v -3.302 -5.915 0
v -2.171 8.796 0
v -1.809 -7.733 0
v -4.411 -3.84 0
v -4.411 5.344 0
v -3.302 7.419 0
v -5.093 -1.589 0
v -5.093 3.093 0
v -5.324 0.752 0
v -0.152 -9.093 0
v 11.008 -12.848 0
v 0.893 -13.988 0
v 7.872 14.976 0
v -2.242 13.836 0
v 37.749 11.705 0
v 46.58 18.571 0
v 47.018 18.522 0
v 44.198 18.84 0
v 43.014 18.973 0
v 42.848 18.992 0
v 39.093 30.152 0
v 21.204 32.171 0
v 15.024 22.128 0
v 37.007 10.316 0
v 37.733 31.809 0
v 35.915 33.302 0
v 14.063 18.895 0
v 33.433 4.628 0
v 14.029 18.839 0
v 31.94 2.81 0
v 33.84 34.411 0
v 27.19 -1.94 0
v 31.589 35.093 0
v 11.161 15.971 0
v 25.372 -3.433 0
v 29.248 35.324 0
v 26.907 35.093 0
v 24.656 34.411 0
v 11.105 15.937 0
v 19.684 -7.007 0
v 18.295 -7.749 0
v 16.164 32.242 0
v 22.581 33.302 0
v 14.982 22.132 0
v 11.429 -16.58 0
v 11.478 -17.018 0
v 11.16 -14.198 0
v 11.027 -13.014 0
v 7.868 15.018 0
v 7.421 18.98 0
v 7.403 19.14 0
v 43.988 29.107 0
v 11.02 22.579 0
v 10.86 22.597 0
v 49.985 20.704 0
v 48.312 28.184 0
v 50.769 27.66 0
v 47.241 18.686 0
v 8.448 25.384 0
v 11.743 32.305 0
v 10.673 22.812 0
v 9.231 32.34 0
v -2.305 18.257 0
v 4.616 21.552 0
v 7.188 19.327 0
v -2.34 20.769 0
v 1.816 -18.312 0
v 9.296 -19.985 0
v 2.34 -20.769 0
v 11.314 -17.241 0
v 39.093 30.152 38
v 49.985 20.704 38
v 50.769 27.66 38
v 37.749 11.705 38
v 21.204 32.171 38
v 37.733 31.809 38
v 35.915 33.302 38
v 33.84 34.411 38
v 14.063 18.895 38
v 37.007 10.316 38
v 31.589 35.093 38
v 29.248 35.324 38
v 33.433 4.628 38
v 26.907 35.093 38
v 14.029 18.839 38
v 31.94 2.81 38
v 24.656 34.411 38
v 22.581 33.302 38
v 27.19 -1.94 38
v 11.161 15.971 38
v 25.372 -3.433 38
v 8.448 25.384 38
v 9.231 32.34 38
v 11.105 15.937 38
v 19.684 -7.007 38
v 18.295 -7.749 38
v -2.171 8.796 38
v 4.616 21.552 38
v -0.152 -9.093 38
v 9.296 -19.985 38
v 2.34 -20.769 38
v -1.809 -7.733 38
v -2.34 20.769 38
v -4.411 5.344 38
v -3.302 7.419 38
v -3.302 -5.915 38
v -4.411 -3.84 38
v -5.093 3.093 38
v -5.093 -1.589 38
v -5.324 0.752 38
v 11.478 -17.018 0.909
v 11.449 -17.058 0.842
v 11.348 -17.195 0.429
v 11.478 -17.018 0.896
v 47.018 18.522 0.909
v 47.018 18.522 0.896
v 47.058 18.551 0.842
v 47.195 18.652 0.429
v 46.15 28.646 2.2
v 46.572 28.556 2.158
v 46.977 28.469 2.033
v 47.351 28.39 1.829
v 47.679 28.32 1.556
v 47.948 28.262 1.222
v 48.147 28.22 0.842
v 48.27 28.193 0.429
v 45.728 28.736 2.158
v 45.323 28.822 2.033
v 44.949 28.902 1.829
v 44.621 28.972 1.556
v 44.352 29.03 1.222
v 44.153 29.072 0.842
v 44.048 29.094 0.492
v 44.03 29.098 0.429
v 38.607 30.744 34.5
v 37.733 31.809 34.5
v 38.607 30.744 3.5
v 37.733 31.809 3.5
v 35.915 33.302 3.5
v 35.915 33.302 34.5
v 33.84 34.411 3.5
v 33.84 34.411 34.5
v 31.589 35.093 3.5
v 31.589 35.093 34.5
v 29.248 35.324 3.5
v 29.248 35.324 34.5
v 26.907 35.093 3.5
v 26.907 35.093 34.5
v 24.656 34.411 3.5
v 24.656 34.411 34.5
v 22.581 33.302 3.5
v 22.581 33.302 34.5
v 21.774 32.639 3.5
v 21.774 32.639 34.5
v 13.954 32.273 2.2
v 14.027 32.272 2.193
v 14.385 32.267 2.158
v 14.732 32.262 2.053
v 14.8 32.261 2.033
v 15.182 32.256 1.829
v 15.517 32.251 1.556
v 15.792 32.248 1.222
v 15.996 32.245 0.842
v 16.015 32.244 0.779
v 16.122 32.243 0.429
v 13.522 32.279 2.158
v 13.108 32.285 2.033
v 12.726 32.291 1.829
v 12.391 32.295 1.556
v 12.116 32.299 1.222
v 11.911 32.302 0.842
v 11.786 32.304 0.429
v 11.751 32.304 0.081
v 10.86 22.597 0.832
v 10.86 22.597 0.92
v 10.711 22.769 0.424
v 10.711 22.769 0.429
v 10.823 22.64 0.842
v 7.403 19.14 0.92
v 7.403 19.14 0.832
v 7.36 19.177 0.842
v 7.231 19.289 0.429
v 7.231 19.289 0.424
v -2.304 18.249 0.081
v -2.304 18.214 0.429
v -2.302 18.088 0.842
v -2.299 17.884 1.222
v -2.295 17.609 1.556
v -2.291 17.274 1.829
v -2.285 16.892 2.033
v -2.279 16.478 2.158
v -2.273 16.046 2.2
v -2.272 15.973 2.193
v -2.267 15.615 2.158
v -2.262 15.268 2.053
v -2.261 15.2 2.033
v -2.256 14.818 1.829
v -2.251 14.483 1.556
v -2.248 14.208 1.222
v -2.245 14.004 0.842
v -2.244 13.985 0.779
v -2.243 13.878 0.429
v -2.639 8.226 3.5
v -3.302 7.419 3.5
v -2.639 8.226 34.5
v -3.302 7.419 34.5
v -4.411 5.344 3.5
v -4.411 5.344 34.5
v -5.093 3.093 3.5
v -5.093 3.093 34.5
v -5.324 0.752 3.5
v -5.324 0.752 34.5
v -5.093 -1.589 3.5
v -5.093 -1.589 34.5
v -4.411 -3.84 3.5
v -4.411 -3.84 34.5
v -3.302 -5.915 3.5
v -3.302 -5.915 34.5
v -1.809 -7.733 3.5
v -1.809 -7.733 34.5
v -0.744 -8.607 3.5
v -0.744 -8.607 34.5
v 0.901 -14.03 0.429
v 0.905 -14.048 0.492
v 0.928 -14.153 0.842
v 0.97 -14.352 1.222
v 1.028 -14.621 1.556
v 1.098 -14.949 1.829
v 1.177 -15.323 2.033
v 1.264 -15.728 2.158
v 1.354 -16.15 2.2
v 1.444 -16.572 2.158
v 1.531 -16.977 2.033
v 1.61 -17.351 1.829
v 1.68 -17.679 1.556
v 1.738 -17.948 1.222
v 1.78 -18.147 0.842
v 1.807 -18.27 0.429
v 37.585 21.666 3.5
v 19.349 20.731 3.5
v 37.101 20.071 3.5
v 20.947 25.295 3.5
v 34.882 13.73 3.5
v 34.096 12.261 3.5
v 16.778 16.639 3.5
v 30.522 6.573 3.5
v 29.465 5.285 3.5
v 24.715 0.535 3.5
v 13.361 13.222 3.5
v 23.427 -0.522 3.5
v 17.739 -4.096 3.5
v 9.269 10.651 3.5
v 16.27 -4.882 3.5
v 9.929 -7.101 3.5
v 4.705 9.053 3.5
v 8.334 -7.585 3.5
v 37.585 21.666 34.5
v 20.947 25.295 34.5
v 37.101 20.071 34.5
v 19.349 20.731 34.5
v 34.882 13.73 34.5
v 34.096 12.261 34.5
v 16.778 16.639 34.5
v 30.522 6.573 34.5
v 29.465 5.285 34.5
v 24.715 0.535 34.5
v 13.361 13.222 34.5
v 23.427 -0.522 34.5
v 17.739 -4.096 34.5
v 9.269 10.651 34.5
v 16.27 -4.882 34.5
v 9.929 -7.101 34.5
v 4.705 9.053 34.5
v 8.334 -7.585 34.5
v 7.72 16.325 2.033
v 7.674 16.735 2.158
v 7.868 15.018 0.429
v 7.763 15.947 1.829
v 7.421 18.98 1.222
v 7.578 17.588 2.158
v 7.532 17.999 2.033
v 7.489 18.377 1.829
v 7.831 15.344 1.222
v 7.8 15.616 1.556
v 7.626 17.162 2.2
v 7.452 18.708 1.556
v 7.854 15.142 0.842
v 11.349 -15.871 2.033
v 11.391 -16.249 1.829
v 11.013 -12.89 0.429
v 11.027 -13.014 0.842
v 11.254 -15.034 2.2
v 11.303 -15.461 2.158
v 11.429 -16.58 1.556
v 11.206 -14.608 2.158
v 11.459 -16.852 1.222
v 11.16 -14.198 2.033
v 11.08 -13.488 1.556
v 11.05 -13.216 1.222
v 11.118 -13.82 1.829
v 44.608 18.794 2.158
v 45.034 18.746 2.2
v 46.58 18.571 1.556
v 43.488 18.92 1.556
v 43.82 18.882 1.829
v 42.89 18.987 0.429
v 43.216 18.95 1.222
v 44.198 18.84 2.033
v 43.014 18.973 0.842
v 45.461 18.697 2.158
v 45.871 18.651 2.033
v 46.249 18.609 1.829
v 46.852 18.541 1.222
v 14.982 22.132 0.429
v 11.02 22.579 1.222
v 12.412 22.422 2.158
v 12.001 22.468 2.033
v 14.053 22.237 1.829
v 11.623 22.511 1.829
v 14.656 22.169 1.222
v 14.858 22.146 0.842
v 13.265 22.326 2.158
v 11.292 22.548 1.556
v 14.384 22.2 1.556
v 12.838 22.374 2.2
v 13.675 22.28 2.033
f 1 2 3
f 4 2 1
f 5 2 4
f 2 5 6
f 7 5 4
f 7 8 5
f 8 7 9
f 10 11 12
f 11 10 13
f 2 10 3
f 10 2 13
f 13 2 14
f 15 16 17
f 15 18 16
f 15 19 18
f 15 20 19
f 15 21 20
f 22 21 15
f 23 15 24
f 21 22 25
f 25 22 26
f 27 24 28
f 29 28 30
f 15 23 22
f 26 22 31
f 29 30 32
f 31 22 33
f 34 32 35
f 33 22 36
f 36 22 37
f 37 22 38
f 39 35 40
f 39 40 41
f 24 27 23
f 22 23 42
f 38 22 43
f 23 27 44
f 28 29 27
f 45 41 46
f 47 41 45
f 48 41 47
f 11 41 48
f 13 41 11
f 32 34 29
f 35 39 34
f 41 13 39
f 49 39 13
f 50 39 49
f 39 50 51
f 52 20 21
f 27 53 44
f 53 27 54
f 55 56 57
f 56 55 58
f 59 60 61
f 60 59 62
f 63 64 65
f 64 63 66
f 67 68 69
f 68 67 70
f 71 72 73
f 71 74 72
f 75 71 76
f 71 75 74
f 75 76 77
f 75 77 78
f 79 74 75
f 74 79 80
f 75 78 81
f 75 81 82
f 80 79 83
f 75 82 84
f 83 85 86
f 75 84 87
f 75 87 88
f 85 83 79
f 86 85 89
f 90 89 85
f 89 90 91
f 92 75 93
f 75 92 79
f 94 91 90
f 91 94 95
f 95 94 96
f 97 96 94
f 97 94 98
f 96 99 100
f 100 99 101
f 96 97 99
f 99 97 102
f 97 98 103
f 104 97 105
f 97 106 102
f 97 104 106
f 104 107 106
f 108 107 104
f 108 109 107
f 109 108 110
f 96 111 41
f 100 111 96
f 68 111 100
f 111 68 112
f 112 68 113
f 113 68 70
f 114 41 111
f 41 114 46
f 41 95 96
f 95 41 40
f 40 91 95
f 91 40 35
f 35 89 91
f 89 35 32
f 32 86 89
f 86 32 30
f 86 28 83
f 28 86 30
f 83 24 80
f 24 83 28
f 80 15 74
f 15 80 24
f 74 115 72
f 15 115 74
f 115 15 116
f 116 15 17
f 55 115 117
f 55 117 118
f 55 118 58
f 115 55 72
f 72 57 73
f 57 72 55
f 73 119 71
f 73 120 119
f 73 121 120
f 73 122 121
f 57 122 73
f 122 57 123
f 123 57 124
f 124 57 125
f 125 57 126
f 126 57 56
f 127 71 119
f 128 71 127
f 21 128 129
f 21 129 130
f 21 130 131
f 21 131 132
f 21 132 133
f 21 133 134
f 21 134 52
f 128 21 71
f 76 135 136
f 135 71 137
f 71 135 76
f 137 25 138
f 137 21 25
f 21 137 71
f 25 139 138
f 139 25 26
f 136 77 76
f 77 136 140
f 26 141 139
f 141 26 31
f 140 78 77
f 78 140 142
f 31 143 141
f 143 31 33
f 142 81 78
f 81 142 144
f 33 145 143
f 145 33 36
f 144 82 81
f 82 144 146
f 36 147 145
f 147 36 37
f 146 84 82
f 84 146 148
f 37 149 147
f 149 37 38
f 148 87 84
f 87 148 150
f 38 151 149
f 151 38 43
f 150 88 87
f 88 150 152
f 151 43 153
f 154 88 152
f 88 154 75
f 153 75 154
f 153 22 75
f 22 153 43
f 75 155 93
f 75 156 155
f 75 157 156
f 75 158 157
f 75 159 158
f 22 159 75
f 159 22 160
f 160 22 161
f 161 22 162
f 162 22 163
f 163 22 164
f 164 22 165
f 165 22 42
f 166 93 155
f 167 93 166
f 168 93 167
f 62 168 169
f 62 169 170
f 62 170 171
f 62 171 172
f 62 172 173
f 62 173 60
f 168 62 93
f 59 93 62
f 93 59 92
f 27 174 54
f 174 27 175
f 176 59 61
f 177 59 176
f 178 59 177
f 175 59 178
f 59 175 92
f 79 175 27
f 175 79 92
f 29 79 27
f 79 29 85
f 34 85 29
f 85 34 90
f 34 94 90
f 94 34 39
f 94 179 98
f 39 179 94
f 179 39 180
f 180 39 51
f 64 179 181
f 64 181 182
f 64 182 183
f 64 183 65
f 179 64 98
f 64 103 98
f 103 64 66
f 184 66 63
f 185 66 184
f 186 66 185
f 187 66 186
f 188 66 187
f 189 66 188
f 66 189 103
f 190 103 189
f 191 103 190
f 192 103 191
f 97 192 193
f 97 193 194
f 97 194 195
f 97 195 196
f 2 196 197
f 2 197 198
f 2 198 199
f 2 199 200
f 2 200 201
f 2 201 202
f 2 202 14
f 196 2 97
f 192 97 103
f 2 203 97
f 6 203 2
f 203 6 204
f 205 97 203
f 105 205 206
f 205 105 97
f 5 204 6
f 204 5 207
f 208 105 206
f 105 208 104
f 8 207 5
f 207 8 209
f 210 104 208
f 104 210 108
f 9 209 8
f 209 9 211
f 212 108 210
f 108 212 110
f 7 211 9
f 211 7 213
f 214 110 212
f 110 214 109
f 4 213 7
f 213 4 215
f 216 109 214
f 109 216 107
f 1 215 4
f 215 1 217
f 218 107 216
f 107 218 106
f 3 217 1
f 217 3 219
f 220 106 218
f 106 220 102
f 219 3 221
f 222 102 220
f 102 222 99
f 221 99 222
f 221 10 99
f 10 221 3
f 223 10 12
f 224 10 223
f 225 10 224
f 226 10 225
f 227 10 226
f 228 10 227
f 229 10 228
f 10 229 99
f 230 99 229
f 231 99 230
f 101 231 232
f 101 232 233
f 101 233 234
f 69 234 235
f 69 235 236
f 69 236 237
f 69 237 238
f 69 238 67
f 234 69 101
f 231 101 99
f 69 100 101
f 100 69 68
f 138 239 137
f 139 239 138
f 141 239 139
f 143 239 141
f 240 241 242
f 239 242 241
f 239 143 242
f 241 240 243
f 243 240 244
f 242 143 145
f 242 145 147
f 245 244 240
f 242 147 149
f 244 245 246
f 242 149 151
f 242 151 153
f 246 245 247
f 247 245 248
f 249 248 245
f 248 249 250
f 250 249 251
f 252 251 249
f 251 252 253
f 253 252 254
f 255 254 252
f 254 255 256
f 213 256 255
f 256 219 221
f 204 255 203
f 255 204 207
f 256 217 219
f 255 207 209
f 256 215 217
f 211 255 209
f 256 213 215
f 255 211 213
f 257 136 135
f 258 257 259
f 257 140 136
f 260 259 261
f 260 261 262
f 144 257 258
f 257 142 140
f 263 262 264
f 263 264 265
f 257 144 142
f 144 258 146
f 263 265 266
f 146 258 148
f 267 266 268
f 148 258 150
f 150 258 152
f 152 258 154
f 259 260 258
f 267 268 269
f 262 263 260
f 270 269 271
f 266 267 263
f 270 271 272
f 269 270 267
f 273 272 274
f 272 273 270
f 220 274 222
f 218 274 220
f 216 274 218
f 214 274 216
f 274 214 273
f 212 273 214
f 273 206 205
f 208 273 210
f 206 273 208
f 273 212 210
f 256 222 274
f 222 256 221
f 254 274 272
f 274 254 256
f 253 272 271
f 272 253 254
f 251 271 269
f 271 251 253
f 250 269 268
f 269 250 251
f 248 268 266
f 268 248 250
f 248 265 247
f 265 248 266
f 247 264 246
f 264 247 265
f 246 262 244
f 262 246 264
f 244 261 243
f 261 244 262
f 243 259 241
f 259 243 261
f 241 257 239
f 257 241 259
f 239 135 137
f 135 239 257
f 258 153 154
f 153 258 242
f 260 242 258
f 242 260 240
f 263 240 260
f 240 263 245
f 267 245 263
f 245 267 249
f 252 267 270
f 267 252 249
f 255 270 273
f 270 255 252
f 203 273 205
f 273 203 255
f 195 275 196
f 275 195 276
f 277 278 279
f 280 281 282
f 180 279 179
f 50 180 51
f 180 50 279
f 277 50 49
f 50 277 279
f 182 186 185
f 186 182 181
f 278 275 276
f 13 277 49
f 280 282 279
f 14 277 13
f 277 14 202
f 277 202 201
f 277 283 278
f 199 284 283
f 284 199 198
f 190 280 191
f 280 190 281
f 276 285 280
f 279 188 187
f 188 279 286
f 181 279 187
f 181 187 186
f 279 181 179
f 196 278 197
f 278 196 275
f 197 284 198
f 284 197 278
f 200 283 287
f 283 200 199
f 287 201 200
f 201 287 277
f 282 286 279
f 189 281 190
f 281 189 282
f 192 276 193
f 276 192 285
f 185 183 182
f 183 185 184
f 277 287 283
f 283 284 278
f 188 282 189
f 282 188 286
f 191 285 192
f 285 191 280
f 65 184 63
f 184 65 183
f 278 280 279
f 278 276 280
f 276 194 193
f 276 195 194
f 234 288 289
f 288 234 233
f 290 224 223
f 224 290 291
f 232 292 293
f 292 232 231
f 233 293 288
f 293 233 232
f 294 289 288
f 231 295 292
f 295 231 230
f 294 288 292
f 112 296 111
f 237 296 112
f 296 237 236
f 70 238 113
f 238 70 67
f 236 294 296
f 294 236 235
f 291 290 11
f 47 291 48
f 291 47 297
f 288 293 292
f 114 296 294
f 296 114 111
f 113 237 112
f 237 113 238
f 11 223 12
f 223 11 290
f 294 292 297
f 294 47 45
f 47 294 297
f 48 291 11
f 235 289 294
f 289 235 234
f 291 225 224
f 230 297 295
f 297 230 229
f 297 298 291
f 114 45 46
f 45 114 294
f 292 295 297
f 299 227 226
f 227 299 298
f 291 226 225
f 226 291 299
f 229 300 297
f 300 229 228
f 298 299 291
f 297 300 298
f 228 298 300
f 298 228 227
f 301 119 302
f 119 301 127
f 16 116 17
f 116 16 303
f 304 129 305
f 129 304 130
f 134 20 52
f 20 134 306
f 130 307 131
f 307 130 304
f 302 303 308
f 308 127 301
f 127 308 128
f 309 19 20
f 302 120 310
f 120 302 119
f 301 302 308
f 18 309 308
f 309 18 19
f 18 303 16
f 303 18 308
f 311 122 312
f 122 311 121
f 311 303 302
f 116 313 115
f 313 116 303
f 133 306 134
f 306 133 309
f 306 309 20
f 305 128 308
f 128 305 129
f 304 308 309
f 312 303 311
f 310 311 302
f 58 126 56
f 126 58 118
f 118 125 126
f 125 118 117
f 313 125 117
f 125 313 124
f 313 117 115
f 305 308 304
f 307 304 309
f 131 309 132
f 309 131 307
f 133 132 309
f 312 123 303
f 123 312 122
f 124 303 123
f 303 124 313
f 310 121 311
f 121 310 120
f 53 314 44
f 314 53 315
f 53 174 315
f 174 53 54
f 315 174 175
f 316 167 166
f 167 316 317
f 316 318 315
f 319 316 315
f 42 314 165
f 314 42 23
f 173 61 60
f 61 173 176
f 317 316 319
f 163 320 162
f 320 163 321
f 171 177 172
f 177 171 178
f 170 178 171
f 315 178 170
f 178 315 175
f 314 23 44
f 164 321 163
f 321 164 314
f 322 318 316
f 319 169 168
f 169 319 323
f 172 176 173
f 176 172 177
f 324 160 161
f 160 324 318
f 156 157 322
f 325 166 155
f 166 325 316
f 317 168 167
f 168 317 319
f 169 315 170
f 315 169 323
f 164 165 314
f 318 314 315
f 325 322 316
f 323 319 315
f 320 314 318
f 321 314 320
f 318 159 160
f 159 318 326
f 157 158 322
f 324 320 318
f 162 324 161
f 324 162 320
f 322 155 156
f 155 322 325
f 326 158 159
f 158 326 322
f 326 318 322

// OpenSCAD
$fn = 32;

// ----------------------------------------------------------------------
// Air duct: 24 mm duct, 3.5 mm wall, 38 mm across
// ----------------------------------------------------------------------

// --- parameters (mm) ---
duct_r = 12;              // duct core radius
duct_d = 24;              // duct core diameter
wall = 3.5;               // duct wall thickness
height = 38;              // duct width (extrusion height)
port_r = 20.9;            // port flange half width
port_d = 41.8;            // port flange width
port_t = 7;               // port flange thickness
bolt_d = 4.4;             // port bolt holes
bolt_offset = 16.2;       // bolt hole offset from the port axis

difference() {
  /* outer hull chain: tube with a flat flange plate at every port */
  linear_extrude(height = 38) {
    hull() {
      polygon([[2.34, -20.769], [-2.34, 20.769], [4.616, 21.552], [9.296, -19.985]]);
      translate([9.937, 1.12]) circle(r = 12);
    }
    hull() {
      translate([9.937, 1.12]) circle(r = 12);
      translate([6.676, 0.752]) circle(r = 12);
    }
    hull() {
      translate([6.676, 0.752]) circle(r = 12);
      translate([13.017, 2.971]) circle(r = 12);
    }
    hull() {
      translate([13.017, 2.971]) circle(r = 12);
      translate([18.705, 6.545]) circle(r = 12);
    }
    hull() {
      translate([18.705, 6.545]) circle(r = 12);
      translate([23.455, 11.295]) circle(r = 12);
    }
    hull() {
      translate([23.455, 11.295]) circle(r = 12);
      translate([27.029, 16.983]) circle(r = 12);
    }
    hull() {
      translate([27.029, 16.983]) circle(r = 12);
      translate([29.248, 23.324]) circle(r = 12);
    }
    hull() {
      translate([29.248, 23.324]) circle(r = 12);
      translate([28.88, 20.063]) circle(r = 12);
    }
    hull() {
      translate([28.88, 20.063]) circle(r = 12);
      polygon([[9.231, 32.34], [50.769, 27.66], [49.985, 20.704], [8.448, 25.384]]);
    }
  }
  /* air passage: the same chain inset by the wall, 5 mm proud of the ports */
  translate([0, 0, 3.5]) linear_extrude(height = 31) {
    hull() {
      translate([-4.969, -0.56]) circle(r = 8.5);
      translate([6.676, 0.752]) circle(r = 8.5);
    }
    hull() {
      translate([6.676, 0.752]) circle(r = 8.5);
      translate([13.017, 2.971]) circle(r = 8.5);
    }
    hull() {
      translate([13.017, 2.971]) circle(r = 8.5);
      translate([18.705, 6.545]) circle(r = 8.5);
    }
    hull() {
      translate([18.705, 6.545]) circle(r = 8.5);
      translate([23.455, 11.295]) circle(r = 8.5);
    }
    hull() {
      translate([23.455, 11.295]) circle(r = 8.5);
      translate([27.029, 16.983]) circle(r = 8.5);
    }
    hull() {
      translate([27.029, 16.983]) circle(r = 8.5);
      translate([29.248, 23.324]) circle(r = 8.5);
    }
    hull() {
      translate([29.248, 23.324]) circle(r = 8.5);
      translate([30.56, 34.969]) circle(r = 8.5);
    }
  }
  translate([0, 0]) rotate([0, 0, -83.57]) translate([-16.2, -2.5]) rotate([-90, 0, 0]) cylinder(h = 12, d = 4.4);
  translate([0, 0]) rotate([0, 0, -83.57]) translate([16.2, -2.5]) rotate([-90, 0, 0]) cylinder(h = 12, d = 4.4);
  translate([30, 30]) rotate([0, 0, 173.57]) translate([-16.2, -2.5]) rotate([-90, 0, 0]) cylinder(h = 12, d = 4.4);
  translate([30, 30]) rotate([0, 0, 173.57]) translate([16.2, -2.5]) rotate([-90, 0, 0]) cylinder(h = 12, d = 4.4);
}
